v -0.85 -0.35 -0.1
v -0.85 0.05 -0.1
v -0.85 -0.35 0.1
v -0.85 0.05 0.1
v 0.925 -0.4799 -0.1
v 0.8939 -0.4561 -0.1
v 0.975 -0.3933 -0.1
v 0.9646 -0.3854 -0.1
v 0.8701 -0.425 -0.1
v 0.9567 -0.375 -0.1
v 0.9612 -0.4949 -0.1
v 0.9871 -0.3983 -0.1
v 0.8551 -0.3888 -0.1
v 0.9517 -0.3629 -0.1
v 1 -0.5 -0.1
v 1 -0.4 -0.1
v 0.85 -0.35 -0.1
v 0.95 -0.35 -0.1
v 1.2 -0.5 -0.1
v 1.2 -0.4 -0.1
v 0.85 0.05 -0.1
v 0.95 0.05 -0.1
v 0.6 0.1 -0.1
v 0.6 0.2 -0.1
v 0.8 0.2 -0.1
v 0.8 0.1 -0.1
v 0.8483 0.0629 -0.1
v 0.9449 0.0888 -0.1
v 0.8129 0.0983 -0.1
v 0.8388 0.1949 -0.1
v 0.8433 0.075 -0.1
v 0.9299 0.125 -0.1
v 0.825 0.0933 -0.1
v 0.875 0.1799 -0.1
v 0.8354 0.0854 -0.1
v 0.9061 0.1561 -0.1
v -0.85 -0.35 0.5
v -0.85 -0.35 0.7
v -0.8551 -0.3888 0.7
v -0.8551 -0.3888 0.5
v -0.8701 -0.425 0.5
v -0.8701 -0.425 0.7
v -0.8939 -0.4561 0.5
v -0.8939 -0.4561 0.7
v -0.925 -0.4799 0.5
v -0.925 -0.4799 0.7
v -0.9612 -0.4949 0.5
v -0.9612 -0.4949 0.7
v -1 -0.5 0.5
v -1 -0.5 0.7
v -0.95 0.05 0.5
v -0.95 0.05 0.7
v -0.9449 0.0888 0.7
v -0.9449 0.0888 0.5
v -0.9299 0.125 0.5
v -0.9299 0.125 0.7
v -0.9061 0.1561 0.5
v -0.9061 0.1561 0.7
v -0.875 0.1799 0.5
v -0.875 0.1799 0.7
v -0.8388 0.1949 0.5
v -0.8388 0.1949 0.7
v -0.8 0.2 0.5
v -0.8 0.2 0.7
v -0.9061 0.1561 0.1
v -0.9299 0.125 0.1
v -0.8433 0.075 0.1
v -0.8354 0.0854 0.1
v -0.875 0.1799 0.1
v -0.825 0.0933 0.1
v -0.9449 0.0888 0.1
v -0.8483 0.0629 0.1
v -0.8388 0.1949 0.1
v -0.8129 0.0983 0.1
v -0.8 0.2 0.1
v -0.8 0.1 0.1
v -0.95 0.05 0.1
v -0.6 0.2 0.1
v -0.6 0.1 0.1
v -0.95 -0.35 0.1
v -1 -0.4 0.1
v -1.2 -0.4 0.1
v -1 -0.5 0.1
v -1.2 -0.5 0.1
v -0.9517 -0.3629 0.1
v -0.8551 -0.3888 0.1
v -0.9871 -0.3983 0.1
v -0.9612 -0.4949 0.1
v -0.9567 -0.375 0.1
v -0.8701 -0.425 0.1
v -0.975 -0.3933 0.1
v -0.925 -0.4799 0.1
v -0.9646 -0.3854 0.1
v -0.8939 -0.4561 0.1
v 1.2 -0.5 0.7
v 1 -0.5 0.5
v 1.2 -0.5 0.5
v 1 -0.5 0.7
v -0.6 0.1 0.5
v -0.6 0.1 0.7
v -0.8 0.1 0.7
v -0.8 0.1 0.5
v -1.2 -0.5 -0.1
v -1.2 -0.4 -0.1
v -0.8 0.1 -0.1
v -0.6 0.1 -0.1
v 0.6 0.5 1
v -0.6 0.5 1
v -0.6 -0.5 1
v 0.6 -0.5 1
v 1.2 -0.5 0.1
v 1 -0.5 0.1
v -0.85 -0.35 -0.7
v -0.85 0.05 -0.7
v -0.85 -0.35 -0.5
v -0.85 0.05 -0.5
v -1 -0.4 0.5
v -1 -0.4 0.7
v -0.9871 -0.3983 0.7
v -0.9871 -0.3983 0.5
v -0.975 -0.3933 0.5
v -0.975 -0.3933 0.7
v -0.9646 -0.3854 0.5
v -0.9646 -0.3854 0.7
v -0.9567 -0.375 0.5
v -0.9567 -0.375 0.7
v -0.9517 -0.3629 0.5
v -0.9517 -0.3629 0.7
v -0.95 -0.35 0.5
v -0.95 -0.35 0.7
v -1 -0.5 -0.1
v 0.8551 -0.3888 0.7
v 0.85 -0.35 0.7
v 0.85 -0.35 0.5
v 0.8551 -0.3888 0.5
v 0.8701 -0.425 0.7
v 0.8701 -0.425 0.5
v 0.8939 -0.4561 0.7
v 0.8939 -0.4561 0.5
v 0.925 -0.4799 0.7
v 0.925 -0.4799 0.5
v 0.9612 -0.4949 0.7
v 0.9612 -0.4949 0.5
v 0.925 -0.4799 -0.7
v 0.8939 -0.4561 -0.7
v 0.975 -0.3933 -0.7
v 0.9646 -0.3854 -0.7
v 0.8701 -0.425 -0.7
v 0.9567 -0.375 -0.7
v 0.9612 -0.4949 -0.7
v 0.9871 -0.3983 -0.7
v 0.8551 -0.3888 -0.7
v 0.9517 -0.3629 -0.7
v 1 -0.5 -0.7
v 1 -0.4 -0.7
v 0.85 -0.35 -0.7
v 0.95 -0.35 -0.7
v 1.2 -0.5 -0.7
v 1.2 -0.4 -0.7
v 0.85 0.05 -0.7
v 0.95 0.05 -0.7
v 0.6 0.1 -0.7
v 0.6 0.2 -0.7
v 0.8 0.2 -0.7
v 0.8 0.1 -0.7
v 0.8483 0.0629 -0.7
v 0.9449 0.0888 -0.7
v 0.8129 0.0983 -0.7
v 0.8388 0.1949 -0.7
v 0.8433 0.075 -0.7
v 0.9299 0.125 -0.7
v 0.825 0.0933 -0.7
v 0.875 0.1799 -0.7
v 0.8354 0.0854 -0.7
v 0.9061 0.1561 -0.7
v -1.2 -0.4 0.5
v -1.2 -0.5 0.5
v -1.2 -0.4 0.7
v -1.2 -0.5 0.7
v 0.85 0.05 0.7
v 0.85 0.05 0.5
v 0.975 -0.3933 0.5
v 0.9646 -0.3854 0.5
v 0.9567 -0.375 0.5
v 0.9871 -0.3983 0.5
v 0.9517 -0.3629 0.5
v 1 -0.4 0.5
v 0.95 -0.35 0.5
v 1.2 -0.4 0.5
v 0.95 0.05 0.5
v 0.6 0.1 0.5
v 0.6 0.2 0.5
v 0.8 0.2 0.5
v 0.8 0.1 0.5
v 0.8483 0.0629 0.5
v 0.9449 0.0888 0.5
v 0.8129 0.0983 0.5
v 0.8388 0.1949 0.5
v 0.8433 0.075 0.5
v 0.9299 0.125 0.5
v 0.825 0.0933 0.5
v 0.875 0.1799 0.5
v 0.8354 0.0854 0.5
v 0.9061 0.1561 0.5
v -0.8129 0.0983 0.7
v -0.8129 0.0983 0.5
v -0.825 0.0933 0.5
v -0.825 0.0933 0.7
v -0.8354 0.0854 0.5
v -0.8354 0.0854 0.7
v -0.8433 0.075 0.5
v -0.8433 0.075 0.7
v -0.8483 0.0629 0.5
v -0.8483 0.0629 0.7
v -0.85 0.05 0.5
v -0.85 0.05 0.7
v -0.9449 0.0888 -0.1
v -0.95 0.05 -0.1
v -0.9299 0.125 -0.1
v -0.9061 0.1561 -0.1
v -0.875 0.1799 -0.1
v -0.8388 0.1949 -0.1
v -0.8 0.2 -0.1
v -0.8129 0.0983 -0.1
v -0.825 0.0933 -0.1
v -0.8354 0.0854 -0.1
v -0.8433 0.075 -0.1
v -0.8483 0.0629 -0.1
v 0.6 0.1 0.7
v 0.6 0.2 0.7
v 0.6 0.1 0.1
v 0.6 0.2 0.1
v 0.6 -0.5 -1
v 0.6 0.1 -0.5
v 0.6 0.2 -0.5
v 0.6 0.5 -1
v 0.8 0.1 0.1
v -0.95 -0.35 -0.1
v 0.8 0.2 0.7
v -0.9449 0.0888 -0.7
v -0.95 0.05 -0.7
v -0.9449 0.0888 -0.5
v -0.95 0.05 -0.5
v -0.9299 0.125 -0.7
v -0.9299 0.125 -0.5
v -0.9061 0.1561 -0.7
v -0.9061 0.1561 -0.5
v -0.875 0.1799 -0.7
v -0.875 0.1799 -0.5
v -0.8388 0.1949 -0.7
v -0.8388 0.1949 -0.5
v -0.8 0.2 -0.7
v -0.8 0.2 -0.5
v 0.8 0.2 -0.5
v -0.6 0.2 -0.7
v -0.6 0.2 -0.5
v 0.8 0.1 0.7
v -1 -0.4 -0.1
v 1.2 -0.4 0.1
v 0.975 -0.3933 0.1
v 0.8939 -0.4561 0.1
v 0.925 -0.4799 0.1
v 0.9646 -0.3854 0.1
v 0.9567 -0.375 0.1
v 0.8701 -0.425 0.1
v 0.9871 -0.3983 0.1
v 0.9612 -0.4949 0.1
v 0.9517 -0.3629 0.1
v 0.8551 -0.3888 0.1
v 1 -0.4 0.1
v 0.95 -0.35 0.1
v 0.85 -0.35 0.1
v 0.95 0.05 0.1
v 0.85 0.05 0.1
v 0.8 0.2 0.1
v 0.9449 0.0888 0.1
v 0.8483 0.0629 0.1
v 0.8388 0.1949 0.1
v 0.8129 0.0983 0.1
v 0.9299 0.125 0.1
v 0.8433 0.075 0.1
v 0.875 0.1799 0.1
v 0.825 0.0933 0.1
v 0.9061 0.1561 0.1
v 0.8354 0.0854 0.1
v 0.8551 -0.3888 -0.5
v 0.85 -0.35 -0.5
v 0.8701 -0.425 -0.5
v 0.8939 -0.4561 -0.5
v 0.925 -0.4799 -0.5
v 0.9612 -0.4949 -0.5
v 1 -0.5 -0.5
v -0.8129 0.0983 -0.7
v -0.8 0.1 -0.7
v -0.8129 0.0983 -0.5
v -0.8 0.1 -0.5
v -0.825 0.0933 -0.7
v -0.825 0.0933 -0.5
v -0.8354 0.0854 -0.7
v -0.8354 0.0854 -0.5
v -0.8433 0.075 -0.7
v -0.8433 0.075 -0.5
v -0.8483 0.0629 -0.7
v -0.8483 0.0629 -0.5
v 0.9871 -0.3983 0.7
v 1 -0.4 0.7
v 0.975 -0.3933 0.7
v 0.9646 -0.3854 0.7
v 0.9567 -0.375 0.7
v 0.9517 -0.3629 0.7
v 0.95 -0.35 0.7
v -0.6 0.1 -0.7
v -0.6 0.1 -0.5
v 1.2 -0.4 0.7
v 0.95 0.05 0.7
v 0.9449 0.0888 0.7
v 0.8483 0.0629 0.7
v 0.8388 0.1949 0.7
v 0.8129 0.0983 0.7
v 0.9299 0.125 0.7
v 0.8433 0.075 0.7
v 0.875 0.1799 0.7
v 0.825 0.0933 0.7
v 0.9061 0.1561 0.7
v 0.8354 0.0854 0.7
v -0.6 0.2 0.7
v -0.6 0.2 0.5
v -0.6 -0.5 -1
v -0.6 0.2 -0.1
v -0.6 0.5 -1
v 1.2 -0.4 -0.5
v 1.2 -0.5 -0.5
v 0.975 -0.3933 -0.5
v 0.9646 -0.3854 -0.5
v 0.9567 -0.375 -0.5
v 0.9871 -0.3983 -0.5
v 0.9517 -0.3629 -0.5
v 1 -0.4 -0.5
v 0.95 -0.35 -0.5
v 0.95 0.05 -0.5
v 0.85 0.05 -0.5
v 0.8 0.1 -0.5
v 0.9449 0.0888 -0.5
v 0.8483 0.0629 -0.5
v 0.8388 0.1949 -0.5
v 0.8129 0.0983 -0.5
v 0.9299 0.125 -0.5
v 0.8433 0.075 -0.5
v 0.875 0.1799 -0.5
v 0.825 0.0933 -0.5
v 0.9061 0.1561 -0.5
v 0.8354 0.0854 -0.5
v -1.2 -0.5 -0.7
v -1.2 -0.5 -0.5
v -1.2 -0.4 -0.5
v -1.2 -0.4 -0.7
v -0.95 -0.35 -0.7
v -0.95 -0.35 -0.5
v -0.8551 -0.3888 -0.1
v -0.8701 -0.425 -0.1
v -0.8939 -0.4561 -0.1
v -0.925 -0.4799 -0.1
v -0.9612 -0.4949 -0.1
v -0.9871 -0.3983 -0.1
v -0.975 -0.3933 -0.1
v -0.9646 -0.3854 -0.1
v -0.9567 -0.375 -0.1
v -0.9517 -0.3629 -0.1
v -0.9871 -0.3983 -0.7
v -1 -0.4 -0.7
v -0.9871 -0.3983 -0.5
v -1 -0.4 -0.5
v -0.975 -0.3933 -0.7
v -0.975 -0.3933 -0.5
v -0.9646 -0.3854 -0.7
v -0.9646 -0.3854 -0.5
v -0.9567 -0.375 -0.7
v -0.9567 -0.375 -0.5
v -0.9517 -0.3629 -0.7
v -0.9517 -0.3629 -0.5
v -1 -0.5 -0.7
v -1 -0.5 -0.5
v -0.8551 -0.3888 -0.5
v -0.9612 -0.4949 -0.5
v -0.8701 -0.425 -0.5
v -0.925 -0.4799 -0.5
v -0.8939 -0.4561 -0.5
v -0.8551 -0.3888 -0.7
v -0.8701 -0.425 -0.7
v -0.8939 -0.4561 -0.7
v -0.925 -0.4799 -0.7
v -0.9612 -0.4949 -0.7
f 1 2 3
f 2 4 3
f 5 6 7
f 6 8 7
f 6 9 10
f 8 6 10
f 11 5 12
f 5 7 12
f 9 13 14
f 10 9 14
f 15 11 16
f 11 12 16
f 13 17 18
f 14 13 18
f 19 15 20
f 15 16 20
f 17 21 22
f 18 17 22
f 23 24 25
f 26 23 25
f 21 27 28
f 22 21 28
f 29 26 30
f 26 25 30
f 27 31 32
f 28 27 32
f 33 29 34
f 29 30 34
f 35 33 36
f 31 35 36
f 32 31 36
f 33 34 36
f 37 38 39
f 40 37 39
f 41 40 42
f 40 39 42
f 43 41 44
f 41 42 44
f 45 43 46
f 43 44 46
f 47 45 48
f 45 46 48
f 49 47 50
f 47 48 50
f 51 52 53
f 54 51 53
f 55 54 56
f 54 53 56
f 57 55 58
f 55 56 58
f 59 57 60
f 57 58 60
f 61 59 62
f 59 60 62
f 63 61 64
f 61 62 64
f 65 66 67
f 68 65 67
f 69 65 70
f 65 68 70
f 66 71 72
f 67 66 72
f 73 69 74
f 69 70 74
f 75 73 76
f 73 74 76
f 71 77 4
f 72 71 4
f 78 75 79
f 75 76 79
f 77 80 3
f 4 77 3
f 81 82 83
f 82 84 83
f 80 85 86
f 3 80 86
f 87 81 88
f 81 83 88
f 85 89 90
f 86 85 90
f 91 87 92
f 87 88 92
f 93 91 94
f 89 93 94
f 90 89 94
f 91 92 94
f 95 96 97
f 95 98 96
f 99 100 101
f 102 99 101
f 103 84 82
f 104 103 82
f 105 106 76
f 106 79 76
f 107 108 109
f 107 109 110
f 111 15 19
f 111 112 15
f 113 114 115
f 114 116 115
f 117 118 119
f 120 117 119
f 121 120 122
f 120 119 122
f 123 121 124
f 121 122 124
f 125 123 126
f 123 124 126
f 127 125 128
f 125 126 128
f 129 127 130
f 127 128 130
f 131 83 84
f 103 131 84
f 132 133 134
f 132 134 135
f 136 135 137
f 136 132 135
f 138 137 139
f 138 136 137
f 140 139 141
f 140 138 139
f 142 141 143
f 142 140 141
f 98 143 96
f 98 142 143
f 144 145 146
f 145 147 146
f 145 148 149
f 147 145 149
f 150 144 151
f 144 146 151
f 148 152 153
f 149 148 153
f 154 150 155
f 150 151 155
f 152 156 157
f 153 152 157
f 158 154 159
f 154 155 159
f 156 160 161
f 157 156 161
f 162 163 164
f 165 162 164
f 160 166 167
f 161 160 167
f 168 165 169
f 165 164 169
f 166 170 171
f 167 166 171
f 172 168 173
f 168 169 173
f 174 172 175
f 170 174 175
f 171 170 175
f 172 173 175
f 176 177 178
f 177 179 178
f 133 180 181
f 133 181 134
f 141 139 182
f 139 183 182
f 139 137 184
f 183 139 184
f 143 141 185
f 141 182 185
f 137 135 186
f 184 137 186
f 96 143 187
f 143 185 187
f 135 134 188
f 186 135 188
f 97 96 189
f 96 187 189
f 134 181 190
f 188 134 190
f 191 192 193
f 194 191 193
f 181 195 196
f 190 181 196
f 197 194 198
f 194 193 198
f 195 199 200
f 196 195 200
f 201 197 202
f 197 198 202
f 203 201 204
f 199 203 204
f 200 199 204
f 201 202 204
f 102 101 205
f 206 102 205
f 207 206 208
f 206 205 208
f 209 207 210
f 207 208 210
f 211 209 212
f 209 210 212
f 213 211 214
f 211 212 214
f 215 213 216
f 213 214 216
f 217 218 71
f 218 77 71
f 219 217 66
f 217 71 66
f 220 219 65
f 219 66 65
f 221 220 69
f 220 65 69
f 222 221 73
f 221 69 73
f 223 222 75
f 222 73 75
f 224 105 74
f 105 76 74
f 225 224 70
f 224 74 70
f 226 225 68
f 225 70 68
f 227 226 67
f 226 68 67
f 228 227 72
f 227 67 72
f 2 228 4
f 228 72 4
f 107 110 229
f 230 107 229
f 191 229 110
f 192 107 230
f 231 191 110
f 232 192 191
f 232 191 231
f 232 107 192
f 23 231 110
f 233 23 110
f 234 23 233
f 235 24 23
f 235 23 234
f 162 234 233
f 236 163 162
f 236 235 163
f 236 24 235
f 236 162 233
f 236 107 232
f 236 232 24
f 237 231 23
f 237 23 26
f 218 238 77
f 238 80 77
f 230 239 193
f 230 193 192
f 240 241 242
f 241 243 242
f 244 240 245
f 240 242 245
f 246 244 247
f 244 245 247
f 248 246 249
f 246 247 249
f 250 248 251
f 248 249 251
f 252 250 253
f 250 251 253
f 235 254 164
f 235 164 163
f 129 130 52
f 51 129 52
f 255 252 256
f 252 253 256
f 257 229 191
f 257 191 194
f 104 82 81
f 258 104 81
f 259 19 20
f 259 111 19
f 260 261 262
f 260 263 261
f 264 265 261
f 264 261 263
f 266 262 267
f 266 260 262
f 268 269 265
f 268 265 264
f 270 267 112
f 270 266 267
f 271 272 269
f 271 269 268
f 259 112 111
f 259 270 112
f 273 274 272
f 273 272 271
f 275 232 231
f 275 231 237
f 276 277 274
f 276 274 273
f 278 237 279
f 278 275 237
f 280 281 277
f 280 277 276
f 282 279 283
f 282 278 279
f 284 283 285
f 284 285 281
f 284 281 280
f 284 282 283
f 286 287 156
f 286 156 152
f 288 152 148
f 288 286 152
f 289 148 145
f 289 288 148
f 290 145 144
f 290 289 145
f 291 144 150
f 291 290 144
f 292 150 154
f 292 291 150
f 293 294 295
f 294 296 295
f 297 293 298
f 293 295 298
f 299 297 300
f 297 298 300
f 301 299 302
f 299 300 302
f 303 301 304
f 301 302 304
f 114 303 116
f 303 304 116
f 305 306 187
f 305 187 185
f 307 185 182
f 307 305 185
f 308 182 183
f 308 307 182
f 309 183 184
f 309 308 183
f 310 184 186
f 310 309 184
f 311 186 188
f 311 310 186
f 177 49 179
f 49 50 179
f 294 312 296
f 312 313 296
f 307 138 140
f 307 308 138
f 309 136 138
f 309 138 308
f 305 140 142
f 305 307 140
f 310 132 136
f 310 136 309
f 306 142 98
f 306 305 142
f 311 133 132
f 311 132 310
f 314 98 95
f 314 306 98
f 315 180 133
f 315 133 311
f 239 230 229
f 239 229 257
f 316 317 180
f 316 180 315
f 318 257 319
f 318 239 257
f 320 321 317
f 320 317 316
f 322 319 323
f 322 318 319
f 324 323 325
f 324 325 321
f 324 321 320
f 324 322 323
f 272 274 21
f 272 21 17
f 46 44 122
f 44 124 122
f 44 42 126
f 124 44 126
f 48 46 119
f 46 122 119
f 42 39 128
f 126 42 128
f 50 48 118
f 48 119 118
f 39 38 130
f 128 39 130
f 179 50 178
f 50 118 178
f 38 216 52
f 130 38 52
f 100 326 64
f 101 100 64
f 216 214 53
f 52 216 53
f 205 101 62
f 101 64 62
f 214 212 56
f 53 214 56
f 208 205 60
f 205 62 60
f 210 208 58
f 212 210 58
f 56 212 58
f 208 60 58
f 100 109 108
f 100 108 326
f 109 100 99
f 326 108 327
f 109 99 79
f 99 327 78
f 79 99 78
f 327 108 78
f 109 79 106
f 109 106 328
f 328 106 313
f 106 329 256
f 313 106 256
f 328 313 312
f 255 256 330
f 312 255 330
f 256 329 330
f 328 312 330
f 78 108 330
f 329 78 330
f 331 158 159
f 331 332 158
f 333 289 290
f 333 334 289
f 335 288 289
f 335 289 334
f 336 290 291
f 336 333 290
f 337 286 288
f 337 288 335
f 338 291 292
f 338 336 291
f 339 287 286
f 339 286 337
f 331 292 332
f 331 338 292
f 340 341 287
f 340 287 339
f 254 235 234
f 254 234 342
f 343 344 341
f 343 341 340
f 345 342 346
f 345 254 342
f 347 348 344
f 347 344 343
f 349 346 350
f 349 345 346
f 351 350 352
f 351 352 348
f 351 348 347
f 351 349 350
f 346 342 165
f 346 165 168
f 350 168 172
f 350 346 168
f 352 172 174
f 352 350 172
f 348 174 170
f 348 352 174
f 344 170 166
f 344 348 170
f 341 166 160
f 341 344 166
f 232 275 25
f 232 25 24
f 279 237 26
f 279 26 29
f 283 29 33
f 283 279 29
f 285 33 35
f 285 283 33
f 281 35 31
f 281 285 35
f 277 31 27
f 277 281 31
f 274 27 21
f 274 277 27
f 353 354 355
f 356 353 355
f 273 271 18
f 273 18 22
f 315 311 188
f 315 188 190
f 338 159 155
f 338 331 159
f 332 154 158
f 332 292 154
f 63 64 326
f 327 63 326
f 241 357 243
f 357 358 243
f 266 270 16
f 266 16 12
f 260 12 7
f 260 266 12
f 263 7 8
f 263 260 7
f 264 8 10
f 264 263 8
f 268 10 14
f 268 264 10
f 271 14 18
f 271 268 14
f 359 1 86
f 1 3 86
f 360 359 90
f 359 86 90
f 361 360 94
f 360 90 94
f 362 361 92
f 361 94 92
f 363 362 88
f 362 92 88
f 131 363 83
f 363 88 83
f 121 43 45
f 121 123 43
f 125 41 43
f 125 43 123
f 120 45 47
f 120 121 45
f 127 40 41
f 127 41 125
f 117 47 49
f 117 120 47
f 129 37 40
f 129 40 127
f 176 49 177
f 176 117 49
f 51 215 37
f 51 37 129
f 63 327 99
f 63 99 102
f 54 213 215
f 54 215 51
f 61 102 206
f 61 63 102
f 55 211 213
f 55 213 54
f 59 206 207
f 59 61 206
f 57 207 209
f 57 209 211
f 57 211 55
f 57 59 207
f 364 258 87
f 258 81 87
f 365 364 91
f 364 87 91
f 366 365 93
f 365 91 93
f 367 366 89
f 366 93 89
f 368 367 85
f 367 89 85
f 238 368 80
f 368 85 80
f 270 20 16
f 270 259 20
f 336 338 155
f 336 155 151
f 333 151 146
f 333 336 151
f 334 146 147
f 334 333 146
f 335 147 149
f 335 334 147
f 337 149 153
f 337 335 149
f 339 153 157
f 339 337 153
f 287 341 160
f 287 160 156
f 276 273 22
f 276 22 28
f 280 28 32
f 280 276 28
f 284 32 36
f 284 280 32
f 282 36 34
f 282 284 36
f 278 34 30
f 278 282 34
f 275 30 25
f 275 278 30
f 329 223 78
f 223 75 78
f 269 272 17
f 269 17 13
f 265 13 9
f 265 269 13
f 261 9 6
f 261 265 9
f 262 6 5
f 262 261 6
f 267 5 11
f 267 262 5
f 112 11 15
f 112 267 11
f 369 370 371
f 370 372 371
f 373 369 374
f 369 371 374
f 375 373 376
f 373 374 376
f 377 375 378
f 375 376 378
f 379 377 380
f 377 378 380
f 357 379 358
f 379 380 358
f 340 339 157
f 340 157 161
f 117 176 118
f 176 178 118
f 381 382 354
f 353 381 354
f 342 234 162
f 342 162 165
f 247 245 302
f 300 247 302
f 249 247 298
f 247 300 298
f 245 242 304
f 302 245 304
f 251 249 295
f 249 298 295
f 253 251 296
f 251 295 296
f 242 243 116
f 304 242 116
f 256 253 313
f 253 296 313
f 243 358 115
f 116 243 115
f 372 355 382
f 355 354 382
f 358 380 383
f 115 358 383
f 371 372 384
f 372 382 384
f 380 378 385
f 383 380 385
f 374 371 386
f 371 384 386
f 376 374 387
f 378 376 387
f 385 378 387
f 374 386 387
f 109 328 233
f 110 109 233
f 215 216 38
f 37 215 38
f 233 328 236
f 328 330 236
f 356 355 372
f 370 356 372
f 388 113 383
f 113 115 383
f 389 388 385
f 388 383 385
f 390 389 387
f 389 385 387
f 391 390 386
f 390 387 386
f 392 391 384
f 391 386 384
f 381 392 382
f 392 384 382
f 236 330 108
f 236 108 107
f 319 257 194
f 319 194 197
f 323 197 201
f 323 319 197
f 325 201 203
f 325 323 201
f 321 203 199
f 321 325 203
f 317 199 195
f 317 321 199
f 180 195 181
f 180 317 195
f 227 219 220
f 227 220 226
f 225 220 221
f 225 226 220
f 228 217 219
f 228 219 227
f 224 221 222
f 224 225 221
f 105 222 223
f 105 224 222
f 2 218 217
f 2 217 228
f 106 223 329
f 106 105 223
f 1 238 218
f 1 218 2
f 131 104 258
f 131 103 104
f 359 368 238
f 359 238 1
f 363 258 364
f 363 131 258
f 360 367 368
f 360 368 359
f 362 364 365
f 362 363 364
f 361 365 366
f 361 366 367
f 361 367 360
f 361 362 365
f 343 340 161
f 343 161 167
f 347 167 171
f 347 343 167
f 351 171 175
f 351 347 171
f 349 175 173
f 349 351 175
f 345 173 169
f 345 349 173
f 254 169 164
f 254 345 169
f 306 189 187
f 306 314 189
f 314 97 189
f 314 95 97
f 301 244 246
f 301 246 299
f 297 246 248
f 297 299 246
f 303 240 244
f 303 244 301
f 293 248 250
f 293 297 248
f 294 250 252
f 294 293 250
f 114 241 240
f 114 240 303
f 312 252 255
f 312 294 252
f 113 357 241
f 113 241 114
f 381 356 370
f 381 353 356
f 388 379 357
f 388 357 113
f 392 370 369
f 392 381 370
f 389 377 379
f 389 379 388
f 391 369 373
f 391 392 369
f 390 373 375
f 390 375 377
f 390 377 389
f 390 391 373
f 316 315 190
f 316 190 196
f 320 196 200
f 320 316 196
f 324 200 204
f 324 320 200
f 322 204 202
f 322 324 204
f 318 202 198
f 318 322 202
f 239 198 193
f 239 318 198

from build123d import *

# Parameters (mm, degrees)
BASES_W              = 1.2
BASES_H              = 2
BASE_DEPTH           = 0.5
MIDDLELEG_DEPTH      = 0.1
LPATTERN1_COUNT      = 3
LPATTERN1_PITCH      = 0.6
MIRROR1_COPY_1_DEPTH = 0.1
MIRROR1_COPY_2_DEPTH = 0.1


with BuildPart() as part:
    # BaseS → Base (new body, symmetric)
    with BuildSketch(Plane(origin=(0, 0, 0), x_dir=(1, 0, 0), z_dir=(0, 1, 0))):
        Rectangle(BASES_W, BASES_H)
    extrude(amount=BASE_DEPTH, both=True)

    # MiddleLegS → MiddleLeg (add, symmetric)
    with BuildSketch(Plane.XY.offset(0.6)):
        with BuildLine():
            Line((1.2, -0.4), (1, -0.4))
            ThreePointArc((1, -0.4), (0.964644661, -0.385355339), (0.95, -0.35))
            Line((0.95, -0.35), (0.95, 0.05))
            ThreePointArc((0.95, 0.05), (0.906066017, 0.156066017), (0.8, 0.2))
            Line((0.8, 0.2), (0.6, 0.2))
            Line((0.6, 0.2), (0.6, 0.1))
            Line((0.6, 0.1), (0.8, 0.1))
            ThreePointArc((0.8, 0.1), (0.835355339, 0.085355339), (0.85, 0.05))
            Line((0.85, 0.05), (0.85, -0.35))
            ThreePointArc((0.85, -0.35), (0.893933983, -0.456066017), (1, -0.5))
            Line((1, -0.5), (1.2, -0.5))
            Line((1.2, -0.5), (1.2, -0.4))
        make_face()
    middleleg = extrude(amount=MIDDLELEG_DEPTH, both=True)

    # LPattern1: MiddleLeg ×3
    with Locations(*[(0, 0, -i * LPATTERN1_PITCH) for i in range(1, LPATTERN1_COUNT)]):
        add(middleleg)

    # Mirror1: MiddleLeg across plane
    add(middleleg.mirror(Plane(origin=(0, 0, 0), x_dir=(0, 0, 1), z_dir=(1, 0, 0))))

    # Mirror1 copy 1 sketch → Mirror1 copy 1 (add, symmetric)
    with BuildSketch(Plane(origin=(0, 0, 0), x_dir=(-1, 0, 0), z_dir=(0, 0, 1))):
        with BuildLine():
            Line((1.2, 0.4), (1, 0.4))
            ThreePointArc((1, 0.4), (0.964644661, 0.385355339), (0.95, 0.35))
            Line((0.95, 0.35), (0.95, -0.05))
            ThreePointArc((0.95, -0.05), (0.906066017, -0.156066017), (0.8, -0.2))
            Line((0.8, -0.2), (0.6, -0.2))
            Line((0.6, -0.2), (0.6, -0.1))
            Line((0.6, -0.1), (0.8, -0.1))
            ThreePointArc((0.8, -0.1), (0.835355339, -0.085355339), (0.85, -0.05))
            Line((0.85, -0.05), (0.85, 0.35))
            ThreePointArc((0.85, 0.35), (0.893933983, 0.456066017), (1, 0.5))
            Line((1, 0.5), (1.2, 0.5))
            Line((1.2, 0.5), (1.2, 0.4))
        make_face()
    extrude(amount=MIRROR1_COPY_1_DEPTH, both=True)

    # Mirror1 copy 2 sketch → Mirror1 copy 2 (add, symmetric)
    with BuildSketch(Plane(origin=(0, 0, -0.6), x_dir=(-1, 0, 0), z_dir=(0, 0, 1))):
        with BuildLine():
            Line((1.2, 0.4), (1, 0.4))
            ThreePointArc((1, 0.4), (0.964644661, 0.385355339), (0.95, 0.35))
            Line((0.95, 0.35), (0.95, -0.05))
            ThreePointArc((0.95, -0.05), (0.906066017, -0.156066017), (0.8, -0.2))
            Line((0.8, -0.2), (0.6, -0.2))
            Line((0.6, -0.2), (0.6, -0.1))
            Line((0.6, -0.1), (0.8, -0.1))
            ThreePointArc((0.8, -0.1), (0.835355339, -0.085355339), (0.85, -0.05))
            Line((0.85, -0.05), (0.85, 0.35))
            ThreePointArc((0.85, 0.35), (0.893933983, 0.456066017), (1, 0.5))
            Line((1, 0.5), (1.2, 0.5))
            Line((1.2, 0.5), (1.2, 0.4))
        make_face()
    extrude(amount=MIRROR1_COPY_2_DEPTH, both=True)


solid = part.part
